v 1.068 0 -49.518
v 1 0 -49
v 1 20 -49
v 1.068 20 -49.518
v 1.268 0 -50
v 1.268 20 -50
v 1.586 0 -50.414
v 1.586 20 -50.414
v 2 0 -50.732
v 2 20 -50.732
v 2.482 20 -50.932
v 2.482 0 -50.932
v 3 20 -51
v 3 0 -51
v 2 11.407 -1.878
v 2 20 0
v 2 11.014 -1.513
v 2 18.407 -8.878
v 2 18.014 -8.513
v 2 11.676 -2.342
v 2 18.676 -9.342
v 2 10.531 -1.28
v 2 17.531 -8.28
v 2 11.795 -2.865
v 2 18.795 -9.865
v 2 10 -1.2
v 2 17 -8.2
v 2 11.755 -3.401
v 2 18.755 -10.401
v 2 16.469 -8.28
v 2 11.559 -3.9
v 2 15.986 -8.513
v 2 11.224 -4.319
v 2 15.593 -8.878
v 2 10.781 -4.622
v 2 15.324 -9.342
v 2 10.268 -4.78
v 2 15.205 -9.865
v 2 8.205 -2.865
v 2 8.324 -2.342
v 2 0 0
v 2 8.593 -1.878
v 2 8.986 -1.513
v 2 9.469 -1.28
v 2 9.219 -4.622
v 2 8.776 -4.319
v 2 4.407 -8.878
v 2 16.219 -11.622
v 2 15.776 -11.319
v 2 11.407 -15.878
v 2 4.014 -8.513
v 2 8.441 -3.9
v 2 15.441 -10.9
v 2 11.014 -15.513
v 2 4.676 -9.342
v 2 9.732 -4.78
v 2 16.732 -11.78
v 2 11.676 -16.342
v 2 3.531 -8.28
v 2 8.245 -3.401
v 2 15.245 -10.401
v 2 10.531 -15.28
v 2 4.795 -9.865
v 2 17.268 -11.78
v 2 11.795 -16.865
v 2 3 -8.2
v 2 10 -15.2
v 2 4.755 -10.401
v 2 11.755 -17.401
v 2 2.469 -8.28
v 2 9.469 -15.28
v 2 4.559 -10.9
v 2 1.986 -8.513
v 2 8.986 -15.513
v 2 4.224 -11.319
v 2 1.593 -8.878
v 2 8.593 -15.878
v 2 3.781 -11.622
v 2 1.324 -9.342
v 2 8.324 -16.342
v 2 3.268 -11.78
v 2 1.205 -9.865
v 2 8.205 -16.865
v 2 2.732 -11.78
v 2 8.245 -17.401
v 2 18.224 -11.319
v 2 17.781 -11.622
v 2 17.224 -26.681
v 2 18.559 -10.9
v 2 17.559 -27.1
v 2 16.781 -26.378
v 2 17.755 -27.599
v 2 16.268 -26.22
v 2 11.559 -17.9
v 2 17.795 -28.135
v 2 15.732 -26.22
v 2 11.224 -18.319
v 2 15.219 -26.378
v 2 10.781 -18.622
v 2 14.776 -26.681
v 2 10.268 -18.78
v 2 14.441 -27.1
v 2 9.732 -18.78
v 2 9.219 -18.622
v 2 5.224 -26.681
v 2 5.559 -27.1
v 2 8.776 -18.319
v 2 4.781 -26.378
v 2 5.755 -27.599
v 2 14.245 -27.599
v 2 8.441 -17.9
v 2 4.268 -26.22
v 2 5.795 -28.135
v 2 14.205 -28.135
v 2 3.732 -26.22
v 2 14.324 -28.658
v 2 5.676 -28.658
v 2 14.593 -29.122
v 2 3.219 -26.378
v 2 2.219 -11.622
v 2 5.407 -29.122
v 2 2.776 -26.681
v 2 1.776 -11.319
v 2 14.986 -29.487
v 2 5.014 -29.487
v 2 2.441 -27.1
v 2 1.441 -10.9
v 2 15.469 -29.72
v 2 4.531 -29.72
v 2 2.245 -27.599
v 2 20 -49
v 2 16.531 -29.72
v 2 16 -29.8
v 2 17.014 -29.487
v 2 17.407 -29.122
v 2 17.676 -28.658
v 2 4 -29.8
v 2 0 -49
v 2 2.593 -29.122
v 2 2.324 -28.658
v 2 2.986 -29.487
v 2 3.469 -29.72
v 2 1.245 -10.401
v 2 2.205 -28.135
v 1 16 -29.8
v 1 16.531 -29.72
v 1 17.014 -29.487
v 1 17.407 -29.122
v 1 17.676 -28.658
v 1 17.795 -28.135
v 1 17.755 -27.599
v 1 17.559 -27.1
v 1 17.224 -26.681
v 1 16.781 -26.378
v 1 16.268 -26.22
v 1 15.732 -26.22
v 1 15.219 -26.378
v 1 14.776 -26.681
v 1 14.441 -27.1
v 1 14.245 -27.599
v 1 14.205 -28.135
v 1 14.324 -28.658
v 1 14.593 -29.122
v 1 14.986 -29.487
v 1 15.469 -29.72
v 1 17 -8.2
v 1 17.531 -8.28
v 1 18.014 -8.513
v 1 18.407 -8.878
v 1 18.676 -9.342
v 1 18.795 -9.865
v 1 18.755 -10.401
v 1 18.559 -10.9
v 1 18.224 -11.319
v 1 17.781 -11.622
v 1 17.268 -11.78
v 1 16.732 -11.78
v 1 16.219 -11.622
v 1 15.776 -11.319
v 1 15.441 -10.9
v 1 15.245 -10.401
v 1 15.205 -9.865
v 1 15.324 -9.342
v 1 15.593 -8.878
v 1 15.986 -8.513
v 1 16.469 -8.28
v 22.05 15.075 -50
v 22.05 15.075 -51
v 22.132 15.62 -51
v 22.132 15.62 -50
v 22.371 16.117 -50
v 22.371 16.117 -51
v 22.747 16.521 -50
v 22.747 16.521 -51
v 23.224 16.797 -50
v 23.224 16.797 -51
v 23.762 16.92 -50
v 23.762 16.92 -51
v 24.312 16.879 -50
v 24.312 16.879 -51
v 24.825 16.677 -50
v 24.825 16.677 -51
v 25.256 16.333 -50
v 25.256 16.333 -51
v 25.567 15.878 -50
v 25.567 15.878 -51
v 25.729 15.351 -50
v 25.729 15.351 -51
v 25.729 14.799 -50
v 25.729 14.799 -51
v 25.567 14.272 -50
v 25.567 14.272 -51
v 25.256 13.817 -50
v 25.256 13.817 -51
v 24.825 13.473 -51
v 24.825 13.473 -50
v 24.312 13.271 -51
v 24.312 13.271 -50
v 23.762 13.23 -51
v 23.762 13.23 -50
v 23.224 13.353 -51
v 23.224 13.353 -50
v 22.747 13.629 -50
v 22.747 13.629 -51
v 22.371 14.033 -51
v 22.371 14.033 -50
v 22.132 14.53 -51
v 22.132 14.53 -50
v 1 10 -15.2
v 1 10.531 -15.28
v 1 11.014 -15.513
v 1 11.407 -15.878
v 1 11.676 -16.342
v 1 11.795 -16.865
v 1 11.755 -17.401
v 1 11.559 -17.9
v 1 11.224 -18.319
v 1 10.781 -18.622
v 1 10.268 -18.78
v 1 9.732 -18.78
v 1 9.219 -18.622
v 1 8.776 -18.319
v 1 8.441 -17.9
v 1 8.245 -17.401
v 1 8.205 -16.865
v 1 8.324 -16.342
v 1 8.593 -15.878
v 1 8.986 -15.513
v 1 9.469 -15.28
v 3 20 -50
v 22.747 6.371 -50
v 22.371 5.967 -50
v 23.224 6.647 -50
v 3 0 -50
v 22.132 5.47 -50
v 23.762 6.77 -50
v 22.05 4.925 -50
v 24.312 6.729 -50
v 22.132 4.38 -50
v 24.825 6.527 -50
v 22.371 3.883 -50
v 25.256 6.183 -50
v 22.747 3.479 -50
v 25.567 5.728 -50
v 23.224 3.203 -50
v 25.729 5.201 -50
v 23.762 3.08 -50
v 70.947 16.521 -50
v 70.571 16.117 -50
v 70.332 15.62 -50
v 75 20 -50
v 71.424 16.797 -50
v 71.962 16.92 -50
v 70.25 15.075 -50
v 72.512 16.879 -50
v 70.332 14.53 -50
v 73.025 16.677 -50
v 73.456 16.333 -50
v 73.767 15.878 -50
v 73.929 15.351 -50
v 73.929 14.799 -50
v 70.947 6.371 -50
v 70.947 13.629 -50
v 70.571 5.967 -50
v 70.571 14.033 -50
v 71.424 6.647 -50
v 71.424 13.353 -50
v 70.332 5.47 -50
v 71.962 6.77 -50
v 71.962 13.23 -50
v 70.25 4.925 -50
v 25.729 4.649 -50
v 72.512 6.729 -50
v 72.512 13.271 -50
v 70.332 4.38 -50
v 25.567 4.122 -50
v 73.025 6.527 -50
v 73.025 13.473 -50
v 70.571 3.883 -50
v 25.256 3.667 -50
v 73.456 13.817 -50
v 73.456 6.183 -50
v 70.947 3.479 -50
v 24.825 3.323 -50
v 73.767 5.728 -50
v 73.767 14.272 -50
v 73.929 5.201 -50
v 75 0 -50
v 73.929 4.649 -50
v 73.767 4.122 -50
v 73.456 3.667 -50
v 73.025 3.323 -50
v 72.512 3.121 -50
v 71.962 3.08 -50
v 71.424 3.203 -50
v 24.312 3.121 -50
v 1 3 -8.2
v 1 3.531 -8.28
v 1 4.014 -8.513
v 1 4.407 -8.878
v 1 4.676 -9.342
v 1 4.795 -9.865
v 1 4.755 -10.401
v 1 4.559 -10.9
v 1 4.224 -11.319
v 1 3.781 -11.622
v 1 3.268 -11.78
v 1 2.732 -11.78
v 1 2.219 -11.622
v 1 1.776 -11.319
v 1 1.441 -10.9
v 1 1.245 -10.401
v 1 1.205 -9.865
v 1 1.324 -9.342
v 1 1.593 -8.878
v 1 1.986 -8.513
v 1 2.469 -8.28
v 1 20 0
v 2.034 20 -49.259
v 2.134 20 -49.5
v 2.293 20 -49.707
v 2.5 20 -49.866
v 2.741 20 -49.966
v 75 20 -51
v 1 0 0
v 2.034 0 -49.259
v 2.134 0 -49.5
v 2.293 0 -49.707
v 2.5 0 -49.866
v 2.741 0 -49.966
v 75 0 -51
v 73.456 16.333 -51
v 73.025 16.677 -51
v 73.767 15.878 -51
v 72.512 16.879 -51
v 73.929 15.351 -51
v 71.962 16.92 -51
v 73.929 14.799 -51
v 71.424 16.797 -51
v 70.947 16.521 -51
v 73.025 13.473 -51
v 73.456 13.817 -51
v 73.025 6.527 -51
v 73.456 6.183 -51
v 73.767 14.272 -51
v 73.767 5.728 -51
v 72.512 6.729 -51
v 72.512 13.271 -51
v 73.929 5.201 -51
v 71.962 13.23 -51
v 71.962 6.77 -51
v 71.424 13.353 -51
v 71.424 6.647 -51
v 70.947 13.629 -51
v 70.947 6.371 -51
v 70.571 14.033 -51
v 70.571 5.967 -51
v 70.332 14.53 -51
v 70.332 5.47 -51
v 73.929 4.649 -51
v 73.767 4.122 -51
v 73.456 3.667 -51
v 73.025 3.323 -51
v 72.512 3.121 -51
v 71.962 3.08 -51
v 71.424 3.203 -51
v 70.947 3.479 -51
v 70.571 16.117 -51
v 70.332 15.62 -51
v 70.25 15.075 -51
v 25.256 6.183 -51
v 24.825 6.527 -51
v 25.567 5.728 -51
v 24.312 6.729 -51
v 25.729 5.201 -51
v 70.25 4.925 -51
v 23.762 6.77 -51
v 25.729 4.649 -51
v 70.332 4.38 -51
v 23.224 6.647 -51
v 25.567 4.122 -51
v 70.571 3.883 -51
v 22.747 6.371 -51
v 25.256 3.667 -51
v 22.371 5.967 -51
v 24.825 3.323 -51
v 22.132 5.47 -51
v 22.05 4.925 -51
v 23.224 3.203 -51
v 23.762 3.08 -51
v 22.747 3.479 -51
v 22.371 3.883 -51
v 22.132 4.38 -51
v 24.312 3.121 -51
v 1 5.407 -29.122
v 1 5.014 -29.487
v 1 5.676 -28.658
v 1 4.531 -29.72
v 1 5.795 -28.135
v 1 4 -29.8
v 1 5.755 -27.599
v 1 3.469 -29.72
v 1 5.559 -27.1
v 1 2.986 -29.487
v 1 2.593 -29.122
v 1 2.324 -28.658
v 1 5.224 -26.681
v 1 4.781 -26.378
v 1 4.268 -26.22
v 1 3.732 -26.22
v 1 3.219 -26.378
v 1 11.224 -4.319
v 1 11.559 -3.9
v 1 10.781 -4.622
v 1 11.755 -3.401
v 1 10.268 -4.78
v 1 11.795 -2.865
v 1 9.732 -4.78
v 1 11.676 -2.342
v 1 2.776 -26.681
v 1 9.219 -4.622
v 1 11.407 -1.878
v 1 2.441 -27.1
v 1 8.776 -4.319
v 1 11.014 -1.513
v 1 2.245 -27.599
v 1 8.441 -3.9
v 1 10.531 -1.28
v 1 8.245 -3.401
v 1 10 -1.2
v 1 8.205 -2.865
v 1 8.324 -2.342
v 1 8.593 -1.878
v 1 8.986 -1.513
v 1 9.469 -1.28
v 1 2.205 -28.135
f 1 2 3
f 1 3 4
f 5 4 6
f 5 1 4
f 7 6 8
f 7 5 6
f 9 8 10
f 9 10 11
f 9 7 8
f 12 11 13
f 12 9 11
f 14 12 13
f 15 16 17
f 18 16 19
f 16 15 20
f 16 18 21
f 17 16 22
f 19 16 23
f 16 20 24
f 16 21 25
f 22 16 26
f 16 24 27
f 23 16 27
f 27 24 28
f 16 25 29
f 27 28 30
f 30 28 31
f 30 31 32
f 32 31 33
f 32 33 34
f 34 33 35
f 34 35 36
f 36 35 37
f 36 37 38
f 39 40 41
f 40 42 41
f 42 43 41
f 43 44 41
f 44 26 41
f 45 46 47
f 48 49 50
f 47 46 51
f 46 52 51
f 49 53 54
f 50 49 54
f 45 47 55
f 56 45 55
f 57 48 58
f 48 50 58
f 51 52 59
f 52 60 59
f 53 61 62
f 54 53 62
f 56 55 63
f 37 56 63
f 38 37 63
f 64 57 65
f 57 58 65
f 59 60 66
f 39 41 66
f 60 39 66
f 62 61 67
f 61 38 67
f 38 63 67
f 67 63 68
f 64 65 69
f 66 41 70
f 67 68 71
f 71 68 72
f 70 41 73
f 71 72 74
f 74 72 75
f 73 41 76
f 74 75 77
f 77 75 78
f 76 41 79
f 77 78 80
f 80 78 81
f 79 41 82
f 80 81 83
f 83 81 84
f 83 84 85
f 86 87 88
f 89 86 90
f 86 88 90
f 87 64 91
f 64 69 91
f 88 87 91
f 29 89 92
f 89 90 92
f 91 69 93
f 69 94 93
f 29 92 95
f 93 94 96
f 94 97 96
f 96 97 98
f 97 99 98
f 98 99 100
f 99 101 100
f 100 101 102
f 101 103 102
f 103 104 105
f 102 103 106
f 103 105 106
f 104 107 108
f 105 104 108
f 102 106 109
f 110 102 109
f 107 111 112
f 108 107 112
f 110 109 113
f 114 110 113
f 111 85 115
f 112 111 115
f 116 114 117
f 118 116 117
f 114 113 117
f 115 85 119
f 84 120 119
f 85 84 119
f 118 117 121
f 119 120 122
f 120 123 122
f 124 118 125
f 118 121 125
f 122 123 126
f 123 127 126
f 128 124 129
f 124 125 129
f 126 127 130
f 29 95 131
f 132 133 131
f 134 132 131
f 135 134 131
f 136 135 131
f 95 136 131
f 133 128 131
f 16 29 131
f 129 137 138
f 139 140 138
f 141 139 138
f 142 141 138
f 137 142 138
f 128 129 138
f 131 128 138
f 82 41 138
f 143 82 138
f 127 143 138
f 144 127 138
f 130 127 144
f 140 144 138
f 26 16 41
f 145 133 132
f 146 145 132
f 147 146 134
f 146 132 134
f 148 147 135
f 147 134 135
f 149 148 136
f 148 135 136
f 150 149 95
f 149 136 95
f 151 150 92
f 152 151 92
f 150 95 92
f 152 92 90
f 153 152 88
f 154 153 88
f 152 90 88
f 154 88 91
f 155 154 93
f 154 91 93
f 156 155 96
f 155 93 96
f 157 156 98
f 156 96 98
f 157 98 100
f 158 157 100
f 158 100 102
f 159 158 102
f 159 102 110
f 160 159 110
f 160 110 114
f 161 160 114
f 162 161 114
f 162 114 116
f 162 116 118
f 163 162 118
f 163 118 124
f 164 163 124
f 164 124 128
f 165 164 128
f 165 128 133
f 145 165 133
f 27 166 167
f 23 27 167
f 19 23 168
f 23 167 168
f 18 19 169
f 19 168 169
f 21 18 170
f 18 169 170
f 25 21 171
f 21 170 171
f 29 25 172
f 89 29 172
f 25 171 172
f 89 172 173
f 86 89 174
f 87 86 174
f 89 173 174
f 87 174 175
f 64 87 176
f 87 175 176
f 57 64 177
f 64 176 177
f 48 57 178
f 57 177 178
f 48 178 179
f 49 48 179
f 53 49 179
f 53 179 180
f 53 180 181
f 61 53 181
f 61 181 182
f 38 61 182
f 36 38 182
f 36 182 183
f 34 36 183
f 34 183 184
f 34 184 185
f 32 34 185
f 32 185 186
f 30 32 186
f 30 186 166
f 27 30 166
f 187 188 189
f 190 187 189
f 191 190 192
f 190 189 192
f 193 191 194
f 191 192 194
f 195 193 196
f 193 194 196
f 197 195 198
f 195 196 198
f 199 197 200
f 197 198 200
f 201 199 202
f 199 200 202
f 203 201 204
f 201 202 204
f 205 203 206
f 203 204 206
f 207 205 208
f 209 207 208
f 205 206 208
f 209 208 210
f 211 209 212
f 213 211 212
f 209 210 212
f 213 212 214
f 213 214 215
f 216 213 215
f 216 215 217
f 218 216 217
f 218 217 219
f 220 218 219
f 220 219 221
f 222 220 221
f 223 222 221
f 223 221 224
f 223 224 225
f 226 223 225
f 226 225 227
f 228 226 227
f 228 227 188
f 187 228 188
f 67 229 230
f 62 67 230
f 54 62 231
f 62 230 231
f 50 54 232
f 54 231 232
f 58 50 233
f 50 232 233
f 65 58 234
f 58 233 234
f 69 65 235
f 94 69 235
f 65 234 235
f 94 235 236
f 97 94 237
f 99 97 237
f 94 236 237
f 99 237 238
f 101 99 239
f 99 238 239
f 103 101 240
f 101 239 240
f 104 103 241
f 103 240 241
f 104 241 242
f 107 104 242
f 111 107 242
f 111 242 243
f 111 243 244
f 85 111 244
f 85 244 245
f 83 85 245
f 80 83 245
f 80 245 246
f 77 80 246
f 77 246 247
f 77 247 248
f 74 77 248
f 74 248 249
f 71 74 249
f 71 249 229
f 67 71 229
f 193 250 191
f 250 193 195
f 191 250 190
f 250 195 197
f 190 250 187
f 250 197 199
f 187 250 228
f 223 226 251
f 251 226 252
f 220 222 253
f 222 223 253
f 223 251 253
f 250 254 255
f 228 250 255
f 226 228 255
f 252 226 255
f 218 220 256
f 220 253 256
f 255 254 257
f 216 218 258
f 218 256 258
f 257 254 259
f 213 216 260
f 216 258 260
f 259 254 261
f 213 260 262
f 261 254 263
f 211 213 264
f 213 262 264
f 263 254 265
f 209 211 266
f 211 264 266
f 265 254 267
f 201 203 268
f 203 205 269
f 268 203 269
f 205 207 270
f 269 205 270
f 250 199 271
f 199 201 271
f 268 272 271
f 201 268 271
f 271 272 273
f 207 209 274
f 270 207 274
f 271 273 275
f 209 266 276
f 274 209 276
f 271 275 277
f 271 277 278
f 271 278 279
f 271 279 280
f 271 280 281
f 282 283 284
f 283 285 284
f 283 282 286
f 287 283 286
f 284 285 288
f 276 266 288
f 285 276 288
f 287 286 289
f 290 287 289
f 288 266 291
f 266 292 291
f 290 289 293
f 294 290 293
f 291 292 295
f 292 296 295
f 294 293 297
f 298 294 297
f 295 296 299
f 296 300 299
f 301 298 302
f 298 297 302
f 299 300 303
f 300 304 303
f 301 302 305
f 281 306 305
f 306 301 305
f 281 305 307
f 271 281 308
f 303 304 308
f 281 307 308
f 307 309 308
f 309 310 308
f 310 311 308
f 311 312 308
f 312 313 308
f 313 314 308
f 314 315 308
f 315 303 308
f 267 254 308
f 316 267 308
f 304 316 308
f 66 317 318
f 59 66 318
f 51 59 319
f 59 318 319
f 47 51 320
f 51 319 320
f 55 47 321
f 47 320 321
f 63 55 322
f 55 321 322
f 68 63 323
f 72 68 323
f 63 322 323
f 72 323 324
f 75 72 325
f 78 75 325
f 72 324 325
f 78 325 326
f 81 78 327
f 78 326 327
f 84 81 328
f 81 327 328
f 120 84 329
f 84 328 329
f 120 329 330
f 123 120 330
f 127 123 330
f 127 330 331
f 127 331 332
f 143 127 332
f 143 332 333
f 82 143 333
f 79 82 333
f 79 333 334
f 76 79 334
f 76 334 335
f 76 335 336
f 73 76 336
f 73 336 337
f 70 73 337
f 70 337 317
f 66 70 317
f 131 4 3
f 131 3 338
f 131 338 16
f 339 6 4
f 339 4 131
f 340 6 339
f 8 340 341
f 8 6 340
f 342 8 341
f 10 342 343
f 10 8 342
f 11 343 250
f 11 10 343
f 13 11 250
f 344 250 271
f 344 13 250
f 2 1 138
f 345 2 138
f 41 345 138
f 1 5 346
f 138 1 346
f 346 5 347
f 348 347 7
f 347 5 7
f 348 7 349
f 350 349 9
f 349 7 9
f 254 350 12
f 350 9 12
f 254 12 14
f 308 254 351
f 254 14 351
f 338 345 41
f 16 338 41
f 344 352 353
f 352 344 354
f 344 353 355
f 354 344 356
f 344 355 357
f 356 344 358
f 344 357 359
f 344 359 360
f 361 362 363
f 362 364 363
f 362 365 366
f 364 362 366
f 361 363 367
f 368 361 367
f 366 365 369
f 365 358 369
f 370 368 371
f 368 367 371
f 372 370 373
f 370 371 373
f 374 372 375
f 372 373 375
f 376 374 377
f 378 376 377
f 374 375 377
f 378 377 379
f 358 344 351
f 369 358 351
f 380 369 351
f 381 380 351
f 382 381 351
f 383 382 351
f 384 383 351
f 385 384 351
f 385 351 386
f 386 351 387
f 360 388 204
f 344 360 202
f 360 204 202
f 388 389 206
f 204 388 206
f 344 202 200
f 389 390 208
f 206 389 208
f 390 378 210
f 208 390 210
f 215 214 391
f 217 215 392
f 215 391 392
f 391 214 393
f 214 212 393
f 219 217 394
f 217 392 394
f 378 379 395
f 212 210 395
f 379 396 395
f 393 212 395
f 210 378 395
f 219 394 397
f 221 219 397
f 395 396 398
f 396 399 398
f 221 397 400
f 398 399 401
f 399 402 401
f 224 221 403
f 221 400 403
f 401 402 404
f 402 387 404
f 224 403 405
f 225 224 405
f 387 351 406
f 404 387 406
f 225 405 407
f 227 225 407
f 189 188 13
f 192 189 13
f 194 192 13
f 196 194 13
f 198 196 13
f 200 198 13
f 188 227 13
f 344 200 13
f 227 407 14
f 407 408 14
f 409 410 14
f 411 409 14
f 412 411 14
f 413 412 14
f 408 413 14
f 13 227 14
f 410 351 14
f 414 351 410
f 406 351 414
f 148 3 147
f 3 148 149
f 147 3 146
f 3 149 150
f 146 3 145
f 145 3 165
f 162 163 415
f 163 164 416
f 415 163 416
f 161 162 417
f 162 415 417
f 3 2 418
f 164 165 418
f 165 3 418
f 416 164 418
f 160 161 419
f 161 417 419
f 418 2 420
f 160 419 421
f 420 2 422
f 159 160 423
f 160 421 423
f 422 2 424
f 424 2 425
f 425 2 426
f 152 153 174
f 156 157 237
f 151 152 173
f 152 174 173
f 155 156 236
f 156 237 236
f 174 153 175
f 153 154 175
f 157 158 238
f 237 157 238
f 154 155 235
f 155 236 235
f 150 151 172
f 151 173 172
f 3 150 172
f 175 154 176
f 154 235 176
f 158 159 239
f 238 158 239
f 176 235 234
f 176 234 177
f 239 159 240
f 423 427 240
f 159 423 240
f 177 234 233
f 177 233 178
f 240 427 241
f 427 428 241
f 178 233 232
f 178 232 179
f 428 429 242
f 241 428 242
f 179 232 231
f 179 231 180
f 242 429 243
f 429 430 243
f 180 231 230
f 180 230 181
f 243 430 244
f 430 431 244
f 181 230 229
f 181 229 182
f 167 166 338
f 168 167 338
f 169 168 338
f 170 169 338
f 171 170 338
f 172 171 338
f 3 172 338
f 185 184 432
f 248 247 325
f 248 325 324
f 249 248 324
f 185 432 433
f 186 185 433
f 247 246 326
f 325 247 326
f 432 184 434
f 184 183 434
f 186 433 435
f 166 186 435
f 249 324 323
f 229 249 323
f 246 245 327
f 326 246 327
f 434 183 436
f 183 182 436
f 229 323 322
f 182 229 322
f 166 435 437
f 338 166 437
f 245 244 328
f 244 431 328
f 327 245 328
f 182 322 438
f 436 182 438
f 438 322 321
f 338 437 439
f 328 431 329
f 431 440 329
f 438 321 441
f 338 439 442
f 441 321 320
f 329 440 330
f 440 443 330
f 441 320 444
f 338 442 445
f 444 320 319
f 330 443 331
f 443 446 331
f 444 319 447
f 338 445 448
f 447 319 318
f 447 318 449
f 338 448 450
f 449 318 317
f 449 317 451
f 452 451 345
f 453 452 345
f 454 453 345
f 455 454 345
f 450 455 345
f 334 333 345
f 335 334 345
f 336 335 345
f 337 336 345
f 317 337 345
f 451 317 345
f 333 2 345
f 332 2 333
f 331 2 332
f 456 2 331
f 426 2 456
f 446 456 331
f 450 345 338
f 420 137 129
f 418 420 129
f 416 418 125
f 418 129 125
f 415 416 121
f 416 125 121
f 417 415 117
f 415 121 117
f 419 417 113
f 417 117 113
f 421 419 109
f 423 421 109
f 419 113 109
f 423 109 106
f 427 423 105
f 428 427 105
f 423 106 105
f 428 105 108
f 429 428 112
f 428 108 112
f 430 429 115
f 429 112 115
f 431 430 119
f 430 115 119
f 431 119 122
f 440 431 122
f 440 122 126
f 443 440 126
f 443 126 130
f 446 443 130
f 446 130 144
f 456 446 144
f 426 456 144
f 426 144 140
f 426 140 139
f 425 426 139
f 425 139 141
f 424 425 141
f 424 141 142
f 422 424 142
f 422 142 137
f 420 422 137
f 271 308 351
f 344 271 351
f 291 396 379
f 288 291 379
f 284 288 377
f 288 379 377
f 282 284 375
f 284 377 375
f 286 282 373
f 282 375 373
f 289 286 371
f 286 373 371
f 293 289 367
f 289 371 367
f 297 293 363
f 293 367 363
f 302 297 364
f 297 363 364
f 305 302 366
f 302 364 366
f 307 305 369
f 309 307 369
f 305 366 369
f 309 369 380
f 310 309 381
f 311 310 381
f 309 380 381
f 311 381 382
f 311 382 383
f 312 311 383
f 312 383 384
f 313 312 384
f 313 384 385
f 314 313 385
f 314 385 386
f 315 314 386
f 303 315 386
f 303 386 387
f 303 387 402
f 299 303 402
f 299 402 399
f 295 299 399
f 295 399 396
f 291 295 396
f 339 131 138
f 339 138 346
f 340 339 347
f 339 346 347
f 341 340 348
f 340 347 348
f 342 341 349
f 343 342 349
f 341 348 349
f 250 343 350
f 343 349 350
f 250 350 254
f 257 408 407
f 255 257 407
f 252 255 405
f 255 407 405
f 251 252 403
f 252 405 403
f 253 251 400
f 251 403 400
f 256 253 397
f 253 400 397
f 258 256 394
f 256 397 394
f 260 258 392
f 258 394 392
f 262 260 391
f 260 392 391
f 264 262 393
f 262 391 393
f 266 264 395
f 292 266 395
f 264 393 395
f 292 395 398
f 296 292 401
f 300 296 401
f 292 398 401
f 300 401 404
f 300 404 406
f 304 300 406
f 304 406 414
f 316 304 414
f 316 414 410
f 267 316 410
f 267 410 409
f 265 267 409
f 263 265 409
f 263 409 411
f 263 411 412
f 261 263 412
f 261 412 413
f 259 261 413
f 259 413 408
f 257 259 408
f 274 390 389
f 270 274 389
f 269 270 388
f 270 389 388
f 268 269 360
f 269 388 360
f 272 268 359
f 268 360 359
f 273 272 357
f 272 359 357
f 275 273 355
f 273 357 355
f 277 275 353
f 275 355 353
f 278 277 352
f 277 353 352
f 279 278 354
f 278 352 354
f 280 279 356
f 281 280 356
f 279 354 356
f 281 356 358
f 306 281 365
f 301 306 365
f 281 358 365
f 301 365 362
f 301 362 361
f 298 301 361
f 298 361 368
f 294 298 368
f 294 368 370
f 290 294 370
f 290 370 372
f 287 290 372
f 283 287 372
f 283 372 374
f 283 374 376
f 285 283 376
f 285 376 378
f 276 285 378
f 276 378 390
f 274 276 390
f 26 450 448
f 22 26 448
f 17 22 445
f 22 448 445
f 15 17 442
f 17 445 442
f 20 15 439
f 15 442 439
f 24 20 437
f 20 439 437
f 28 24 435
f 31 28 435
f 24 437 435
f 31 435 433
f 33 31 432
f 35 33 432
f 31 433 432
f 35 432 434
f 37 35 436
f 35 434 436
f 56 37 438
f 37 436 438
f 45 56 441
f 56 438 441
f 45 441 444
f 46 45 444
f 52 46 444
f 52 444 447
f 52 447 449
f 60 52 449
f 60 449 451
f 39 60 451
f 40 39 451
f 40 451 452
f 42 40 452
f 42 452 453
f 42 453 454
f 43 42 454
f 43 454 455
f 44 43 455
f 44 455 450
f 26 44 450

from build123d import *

# Parameters (mm, degrees)
EXTRUDE_1_DEPTH       = 20
SKETCH_22_R           = 1.8
CUT_EXTRUDE_1_DEPTH   = 93.070625066
SKETCH_23_R           = 1.85
CUT_EXTRUDE_2_DEPTH   = 93.876261768
SHEET_METAL_1_DEPTH   = 20
SHEET_METAL_1_2_DEPTH = 20
SKETCH_24_R           = 1.8
CUT_EXTRUDE_3_DEPTH   = 92.268833673


# Read off the part's stored shape, not the designer's step: 转换实体1
with BuildPart() as part:
    # Sketch 1 → 凸台-拉伸1 (new body)
    with BuildSketch(Plane(origin=(0, 0, 0), x_dir=(1, 0, 0), z_dir=(0, 1, 0))):
        Polygon((2, 0), (2, 50), (74, 50), (75, 50), (75, 51), (1, 51), (1, 0), align=None)
    extrude(amount=EXTRUDE_1_DEPTH)

    # 草图22 → 切除-拉伸1 (cut, through all)
    with BuildSketch(Plane.ZY.offset(-1)):
        with Locations((-17, 10)):
            Circle(SKETCH_22_R)
        with Locations((-10, 17)):
            Circle(SKETCH_22_R)
        with Locations((-3, 10)):
            Circle(SKETCH_22_R)
        with Locations((-10, 3)):
            Circle(SKETCH_22_R)
    extrude(amount=-CUT_EXTRUDE_1_DEPTH, mode=Mode.SUBTRACT)

    # 草图23 → 切除-拉伸2 (cut, through all)
    with BuildSketch(Plane(origin=(0, 0, -51), x_dir=(-1, 0, 0), z_dir=(0, 0, -1))):
        with Locations((-72.1, 15.075)):
            Circle(SKETCH_23_R)
        with Locations((-72.1, 4.925)):
            Circle(SKETCH_23_R)
        with Locations((-23.9, 4.925)):
            Circle(SKETCH_23_R)
        with Locations((-23.9, 15.075)):
            Circle(SKETCH_23_R)
    extrude(amount=-CUT_EXTRUDE_2_DEPTH, mode=Mode.SUBTRACT)

    # Sheet Metal 1 outline → Sheet Metal 1 (cut)
    with BuildSketch(Plane(origin=(0, 0, 0), x_dir=(1, 0, 0), z_dir=(0, 1, 0))):
        with BuildLine():
            Line((1, 51), (1, 49))
            ThreePointArc((1, 49), (1.585786438, 50.414213562), (3, 51))
            Line((3, 51), (1, 51))
        make_face()
    extrude(amount=SHEET_METAL_1_DEPTH, mode=Mode.SUBTRACT)

    # Sheet Metal 1 2 outline → Sheet Metal 1 2 (add)
    with BuildSketch(Plane(origin=(0, 0, 0), x_dir=(1, 0, 0), z_dir=(0, 1, 0))):
        with BuildLine():
            Line((2, 50), (2, 49))
            ThreePointArc((2, 49), (2.292893219, 49.707106781), (3, 50))
            Line((3, 50), (2, 50))
        make_face()
    extrude(amount=SHEET_METAL_1_2_DEPTH)

    # 草图24 → 切除-拉伸3 (cut, through all)
    with BuildSketch(Plane(origin=(2, 0, 0), x_dir=(0, 0, -1), z_dir=(1, 0, 0))):
        with Locations((28, 16)):
            Circle(SKETCH_24_R)
        with Locations((28, 4)):
            Circle(SKETCH_24_R)
    extrude(amount=-CUT_EXTRUDE_3_DEPTH, mode=Mode.SUBTRACT)


solid = part.part
